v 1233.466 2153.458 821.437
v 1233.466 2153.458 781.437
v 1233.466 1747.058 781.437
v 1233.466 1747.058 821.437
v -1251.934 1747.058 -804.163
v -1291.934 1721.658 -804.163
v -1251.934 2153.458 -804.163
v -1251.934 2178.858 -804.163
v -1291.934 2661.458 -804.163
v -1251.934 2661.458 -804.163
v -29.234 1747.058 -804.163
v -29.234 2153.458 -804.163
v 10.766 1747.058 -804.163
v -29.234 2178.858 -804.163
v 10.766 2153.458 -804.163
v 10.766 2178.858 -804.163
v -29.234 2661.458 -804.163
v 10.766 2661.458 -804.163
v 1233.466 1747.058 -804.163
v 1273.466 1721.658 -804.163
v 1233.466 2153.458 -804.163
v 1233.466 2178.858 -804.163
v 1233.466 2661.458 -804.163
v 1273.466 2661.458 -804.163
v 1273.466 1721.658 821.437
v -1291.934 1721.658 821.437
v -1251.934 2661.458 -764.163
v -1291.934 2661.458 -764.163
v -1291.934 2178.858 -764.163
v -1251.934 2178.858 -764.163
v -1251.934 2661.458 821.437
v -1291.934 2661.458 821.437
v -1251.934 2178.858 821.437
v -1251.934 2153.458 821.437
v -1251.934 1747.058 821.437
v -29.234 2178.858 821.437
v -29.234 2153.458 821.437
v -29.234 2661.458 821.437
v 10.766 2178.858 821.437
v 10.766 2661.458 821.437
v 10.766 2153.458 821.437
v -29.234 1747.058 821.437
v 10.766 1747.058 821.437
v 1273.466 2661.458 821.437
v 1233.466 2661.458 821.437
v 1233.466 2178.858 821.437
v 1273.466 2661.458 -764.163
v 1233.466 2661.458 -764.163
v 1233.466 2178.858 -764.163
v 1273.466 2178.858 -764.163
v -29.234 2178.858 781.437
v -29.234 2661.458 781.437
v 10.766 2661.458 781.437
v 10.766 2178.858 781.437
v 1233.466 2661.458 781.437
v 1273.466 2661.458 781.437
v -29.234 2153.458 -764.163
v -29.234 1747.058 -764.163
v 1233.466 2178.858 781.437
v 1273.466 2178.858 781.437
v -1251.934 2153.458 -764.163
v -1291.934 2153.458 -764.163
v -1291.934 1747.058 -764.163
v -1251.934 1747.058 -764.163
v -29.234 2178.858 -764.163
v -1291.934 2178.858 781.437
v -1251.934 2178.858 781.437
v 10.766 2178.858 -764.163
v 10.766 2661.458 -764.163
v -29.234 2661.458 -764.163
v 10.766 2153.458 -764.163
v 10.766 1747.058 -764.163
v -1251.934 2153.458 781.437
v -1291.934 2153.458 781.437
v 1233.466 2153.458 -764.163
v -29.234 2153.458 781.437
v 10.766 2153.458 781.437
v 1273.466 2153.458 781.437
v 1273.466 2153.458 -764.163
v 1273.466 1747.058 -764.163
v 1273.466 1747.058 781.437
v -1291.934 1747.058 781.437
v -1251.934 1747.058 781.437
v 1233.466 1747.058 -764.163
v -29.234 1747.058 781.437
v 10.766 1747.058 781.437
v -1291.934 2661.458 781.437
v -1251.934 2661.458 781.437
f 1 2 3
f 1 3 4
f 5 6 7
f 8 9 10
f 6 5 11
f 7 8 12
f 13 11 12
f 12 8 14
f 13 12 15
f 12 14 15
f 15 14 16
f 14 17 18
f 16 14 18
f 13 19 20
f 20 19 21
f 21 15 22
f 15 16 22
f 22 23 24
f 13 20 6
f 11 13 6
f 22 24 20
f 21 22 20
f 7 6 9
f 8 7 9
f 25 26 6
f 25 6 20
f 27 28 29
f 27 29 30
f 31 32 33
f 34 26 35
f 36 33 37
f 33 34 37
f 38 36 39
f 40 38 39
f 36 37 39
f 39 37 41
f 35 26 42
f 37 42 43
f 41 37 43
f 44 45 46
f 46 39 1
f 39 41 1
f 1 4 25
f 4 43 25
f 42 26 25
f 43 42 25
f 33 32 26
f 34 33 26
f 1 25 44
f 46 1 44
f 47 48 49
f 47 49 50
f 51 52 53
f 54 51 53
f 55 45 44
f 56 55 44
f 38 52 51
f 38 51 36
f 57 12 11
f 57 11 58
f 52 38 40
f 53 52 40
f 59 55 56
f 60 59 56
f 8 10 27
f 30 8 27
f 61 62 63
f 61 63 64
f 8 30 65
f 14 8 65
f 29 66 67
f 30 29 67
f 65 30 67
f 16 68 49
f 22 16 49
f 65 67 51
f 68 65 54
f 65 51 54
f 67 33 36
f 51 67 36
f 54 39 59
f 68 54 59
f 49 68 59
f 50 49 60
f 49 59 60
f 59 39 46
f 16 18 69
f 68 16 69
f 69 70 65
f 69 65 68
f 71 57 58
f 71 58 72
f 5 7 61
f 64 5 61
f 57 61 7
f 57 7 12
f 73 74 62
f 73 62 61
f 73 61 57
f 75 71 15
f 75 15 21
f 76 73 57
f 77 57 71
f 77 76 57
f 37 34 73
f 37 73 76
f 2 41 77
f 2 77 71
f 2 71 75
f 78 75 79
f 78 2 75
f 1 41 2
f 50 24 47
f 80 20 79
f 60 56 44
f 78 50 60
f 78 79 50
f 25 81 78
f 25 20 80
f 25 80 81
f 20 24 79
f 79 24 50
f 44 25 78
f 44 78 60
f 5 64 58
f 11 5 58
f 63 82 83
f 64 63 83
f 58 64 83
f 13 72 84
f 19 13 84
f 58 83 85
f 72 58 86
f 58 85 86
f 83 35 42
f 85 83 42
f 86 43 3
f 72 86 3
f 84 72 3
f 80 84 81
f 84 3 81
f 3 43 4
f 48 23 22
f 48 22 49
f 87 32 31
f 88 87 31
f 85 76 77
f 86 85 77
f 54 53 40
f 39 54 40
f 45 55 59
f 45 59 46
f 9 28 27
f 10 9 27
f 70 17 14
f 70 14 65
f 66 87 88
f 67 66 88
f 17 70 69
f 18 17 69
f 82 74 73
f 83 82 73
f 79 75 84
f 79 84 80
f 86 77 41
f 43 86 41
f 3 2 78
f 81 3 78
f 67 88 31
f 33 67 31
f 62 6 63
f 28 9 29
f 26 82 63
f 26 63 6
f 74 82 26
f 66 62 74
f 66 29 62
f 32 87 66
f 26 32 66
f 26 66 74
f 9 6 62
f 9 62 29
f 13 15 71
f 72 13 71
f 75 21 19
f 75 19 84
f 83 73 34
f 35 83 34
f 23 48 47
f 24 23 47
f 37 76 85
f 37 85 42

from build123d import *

# Parameters (mm, degrees)
SKETCH1_W             = 40
SKETCH1_H             = 40
BOSS_EXTRUDE1_DEPTH   = 939.8
BOSS_EXTRUDE1_2_DEPTH = 939.8
BOSS_EXTRUDE1_3_DEPTH = 939.8
BOSS_EXTRUDE1_4_DEPTH = 939.8
BOSS_EXTRUDE1_5_DEPTH = 939.8
BOSS_EXTRUDE1_6_DEPTH = 939.8
SKETCH2_W             = 2565.4
SKETCH2_H             = 1625.6
BOSS_EXTRUDE2_DEPTH   = 25.4
SKETCH3_W             = 2565.4
SKETCH3_H             = 1625.6
BOSS_EXTRUDE3_DEPTH   = 25.4


with BuildPart() as part:
    # Sketch1 → Boss-Extrude1 (new body)
    with BuildSketch(Plane.XZ.offset(-2661.458218508)):
        with Locations((1253.466421536, 801.437438082)):
            Rectangle(SKETCH1_W, SKETCH1_H)
    extrude(amount=BOSS_EXTRUDE1_DEPTH)



with BuildPart() as body_2:
    # Sketch1 → Boss-Extrude1 2 (new body)
    with BuildSketch(Plane.XZ.offset(-2661.458218508)):
        with Locations((-1271.933578464, 801.437438082)):
            Rectangle(SKETCH1_W, SKETCH1_H)
    extrude(amount=BOSS_EXTRUDE1_2_DEPTH)


with BuildPart() as body_3:
    # Sketch1 → Boss-Extrude1 3 (new body)
    with BuildSketch(Plane.XZ.offset(-2661.458218508)):
        with Locations((-9.233578464, 801.437438082)):
            Rectangle(SKETCH1_W, SKETCH1_H)
    extrude(amount=BOSS_EXTRUDE1_3_DEPTH)


with BuildPart() as body_4:
    # Sketch1 → Boss-Extrude1 4 (new body)
    with BuildSketch(Plane.XZ.offset(-2661.458218508)):
        with Locations((-1271.933578464, -784.162561918)):
            Rectangle(SKETCH1_W, SKETCH1_H)
    extrude(amount=BOSS_EXTRUDE1_4_DEPTH)


with BuildPart() as body_5:
    # Sketch1 → Boss-Extrude1 5 (new body)
    with BuildSketch(Plane.XZ.offset(-2661.458218508)):
        with Locations((-9.233578464, -784.162561918)):
            Rectangle(SKETCH1_W, SKETCH1_H)
    extrude(amount=BOSS_EXTRUDE1_5_DEPTH)


with BuildPart() as body_6:
    # Sketch1 → Boss-Extrude1 6 (new body)
    with BuildSketch(Plane.XZ.offset(-2661.458218508)):
        with Locations((1253.466421536, -784.162561918)):
            Rectangle(SKETCH1_W, SKETCH1_H)
    extrude(amount=BOSS_EXTRUDE1_6_DEPTH)


with BuildPart() as part_1:
    add(part.part)

    add(body_2.part)  # Boss-Extrude2 merges body 2

    add(body_3.part)  # Boss-Extrude2 merges body 3

    add(body_4.part)  # Boss-Extrude2 merges body 4

    add(body_5.part)  # Boss-Extrude2 merges body 5

    add(body_6.part)  # Boss-Extrude2 merges body 6
    # Sketch2 → Boss-Extrude2 (add)
    with BuildSketch(Plane.XZ.offset(-1721.658218508)):
        with Locations((-9.233578464, 8.637438082)):
            Rectangle(SKETCH2_W, SKETCH2_H)
    extrude(amount=-BOSS_EXTRUDE2_DEPTH)

    # Sketch3 → Boss-Extrude3 (add)
    with BuildSketch(Plane.XZ.offset(-2153.458218508)):
        with Locations((-9.233578464, 8.637438082)):
            Rectangle(SKETCH3_W, SKETCH3_H)
    extrude(amount=-BOSS_EXTRUDE3_DEPTH)


solid = part_1.part
